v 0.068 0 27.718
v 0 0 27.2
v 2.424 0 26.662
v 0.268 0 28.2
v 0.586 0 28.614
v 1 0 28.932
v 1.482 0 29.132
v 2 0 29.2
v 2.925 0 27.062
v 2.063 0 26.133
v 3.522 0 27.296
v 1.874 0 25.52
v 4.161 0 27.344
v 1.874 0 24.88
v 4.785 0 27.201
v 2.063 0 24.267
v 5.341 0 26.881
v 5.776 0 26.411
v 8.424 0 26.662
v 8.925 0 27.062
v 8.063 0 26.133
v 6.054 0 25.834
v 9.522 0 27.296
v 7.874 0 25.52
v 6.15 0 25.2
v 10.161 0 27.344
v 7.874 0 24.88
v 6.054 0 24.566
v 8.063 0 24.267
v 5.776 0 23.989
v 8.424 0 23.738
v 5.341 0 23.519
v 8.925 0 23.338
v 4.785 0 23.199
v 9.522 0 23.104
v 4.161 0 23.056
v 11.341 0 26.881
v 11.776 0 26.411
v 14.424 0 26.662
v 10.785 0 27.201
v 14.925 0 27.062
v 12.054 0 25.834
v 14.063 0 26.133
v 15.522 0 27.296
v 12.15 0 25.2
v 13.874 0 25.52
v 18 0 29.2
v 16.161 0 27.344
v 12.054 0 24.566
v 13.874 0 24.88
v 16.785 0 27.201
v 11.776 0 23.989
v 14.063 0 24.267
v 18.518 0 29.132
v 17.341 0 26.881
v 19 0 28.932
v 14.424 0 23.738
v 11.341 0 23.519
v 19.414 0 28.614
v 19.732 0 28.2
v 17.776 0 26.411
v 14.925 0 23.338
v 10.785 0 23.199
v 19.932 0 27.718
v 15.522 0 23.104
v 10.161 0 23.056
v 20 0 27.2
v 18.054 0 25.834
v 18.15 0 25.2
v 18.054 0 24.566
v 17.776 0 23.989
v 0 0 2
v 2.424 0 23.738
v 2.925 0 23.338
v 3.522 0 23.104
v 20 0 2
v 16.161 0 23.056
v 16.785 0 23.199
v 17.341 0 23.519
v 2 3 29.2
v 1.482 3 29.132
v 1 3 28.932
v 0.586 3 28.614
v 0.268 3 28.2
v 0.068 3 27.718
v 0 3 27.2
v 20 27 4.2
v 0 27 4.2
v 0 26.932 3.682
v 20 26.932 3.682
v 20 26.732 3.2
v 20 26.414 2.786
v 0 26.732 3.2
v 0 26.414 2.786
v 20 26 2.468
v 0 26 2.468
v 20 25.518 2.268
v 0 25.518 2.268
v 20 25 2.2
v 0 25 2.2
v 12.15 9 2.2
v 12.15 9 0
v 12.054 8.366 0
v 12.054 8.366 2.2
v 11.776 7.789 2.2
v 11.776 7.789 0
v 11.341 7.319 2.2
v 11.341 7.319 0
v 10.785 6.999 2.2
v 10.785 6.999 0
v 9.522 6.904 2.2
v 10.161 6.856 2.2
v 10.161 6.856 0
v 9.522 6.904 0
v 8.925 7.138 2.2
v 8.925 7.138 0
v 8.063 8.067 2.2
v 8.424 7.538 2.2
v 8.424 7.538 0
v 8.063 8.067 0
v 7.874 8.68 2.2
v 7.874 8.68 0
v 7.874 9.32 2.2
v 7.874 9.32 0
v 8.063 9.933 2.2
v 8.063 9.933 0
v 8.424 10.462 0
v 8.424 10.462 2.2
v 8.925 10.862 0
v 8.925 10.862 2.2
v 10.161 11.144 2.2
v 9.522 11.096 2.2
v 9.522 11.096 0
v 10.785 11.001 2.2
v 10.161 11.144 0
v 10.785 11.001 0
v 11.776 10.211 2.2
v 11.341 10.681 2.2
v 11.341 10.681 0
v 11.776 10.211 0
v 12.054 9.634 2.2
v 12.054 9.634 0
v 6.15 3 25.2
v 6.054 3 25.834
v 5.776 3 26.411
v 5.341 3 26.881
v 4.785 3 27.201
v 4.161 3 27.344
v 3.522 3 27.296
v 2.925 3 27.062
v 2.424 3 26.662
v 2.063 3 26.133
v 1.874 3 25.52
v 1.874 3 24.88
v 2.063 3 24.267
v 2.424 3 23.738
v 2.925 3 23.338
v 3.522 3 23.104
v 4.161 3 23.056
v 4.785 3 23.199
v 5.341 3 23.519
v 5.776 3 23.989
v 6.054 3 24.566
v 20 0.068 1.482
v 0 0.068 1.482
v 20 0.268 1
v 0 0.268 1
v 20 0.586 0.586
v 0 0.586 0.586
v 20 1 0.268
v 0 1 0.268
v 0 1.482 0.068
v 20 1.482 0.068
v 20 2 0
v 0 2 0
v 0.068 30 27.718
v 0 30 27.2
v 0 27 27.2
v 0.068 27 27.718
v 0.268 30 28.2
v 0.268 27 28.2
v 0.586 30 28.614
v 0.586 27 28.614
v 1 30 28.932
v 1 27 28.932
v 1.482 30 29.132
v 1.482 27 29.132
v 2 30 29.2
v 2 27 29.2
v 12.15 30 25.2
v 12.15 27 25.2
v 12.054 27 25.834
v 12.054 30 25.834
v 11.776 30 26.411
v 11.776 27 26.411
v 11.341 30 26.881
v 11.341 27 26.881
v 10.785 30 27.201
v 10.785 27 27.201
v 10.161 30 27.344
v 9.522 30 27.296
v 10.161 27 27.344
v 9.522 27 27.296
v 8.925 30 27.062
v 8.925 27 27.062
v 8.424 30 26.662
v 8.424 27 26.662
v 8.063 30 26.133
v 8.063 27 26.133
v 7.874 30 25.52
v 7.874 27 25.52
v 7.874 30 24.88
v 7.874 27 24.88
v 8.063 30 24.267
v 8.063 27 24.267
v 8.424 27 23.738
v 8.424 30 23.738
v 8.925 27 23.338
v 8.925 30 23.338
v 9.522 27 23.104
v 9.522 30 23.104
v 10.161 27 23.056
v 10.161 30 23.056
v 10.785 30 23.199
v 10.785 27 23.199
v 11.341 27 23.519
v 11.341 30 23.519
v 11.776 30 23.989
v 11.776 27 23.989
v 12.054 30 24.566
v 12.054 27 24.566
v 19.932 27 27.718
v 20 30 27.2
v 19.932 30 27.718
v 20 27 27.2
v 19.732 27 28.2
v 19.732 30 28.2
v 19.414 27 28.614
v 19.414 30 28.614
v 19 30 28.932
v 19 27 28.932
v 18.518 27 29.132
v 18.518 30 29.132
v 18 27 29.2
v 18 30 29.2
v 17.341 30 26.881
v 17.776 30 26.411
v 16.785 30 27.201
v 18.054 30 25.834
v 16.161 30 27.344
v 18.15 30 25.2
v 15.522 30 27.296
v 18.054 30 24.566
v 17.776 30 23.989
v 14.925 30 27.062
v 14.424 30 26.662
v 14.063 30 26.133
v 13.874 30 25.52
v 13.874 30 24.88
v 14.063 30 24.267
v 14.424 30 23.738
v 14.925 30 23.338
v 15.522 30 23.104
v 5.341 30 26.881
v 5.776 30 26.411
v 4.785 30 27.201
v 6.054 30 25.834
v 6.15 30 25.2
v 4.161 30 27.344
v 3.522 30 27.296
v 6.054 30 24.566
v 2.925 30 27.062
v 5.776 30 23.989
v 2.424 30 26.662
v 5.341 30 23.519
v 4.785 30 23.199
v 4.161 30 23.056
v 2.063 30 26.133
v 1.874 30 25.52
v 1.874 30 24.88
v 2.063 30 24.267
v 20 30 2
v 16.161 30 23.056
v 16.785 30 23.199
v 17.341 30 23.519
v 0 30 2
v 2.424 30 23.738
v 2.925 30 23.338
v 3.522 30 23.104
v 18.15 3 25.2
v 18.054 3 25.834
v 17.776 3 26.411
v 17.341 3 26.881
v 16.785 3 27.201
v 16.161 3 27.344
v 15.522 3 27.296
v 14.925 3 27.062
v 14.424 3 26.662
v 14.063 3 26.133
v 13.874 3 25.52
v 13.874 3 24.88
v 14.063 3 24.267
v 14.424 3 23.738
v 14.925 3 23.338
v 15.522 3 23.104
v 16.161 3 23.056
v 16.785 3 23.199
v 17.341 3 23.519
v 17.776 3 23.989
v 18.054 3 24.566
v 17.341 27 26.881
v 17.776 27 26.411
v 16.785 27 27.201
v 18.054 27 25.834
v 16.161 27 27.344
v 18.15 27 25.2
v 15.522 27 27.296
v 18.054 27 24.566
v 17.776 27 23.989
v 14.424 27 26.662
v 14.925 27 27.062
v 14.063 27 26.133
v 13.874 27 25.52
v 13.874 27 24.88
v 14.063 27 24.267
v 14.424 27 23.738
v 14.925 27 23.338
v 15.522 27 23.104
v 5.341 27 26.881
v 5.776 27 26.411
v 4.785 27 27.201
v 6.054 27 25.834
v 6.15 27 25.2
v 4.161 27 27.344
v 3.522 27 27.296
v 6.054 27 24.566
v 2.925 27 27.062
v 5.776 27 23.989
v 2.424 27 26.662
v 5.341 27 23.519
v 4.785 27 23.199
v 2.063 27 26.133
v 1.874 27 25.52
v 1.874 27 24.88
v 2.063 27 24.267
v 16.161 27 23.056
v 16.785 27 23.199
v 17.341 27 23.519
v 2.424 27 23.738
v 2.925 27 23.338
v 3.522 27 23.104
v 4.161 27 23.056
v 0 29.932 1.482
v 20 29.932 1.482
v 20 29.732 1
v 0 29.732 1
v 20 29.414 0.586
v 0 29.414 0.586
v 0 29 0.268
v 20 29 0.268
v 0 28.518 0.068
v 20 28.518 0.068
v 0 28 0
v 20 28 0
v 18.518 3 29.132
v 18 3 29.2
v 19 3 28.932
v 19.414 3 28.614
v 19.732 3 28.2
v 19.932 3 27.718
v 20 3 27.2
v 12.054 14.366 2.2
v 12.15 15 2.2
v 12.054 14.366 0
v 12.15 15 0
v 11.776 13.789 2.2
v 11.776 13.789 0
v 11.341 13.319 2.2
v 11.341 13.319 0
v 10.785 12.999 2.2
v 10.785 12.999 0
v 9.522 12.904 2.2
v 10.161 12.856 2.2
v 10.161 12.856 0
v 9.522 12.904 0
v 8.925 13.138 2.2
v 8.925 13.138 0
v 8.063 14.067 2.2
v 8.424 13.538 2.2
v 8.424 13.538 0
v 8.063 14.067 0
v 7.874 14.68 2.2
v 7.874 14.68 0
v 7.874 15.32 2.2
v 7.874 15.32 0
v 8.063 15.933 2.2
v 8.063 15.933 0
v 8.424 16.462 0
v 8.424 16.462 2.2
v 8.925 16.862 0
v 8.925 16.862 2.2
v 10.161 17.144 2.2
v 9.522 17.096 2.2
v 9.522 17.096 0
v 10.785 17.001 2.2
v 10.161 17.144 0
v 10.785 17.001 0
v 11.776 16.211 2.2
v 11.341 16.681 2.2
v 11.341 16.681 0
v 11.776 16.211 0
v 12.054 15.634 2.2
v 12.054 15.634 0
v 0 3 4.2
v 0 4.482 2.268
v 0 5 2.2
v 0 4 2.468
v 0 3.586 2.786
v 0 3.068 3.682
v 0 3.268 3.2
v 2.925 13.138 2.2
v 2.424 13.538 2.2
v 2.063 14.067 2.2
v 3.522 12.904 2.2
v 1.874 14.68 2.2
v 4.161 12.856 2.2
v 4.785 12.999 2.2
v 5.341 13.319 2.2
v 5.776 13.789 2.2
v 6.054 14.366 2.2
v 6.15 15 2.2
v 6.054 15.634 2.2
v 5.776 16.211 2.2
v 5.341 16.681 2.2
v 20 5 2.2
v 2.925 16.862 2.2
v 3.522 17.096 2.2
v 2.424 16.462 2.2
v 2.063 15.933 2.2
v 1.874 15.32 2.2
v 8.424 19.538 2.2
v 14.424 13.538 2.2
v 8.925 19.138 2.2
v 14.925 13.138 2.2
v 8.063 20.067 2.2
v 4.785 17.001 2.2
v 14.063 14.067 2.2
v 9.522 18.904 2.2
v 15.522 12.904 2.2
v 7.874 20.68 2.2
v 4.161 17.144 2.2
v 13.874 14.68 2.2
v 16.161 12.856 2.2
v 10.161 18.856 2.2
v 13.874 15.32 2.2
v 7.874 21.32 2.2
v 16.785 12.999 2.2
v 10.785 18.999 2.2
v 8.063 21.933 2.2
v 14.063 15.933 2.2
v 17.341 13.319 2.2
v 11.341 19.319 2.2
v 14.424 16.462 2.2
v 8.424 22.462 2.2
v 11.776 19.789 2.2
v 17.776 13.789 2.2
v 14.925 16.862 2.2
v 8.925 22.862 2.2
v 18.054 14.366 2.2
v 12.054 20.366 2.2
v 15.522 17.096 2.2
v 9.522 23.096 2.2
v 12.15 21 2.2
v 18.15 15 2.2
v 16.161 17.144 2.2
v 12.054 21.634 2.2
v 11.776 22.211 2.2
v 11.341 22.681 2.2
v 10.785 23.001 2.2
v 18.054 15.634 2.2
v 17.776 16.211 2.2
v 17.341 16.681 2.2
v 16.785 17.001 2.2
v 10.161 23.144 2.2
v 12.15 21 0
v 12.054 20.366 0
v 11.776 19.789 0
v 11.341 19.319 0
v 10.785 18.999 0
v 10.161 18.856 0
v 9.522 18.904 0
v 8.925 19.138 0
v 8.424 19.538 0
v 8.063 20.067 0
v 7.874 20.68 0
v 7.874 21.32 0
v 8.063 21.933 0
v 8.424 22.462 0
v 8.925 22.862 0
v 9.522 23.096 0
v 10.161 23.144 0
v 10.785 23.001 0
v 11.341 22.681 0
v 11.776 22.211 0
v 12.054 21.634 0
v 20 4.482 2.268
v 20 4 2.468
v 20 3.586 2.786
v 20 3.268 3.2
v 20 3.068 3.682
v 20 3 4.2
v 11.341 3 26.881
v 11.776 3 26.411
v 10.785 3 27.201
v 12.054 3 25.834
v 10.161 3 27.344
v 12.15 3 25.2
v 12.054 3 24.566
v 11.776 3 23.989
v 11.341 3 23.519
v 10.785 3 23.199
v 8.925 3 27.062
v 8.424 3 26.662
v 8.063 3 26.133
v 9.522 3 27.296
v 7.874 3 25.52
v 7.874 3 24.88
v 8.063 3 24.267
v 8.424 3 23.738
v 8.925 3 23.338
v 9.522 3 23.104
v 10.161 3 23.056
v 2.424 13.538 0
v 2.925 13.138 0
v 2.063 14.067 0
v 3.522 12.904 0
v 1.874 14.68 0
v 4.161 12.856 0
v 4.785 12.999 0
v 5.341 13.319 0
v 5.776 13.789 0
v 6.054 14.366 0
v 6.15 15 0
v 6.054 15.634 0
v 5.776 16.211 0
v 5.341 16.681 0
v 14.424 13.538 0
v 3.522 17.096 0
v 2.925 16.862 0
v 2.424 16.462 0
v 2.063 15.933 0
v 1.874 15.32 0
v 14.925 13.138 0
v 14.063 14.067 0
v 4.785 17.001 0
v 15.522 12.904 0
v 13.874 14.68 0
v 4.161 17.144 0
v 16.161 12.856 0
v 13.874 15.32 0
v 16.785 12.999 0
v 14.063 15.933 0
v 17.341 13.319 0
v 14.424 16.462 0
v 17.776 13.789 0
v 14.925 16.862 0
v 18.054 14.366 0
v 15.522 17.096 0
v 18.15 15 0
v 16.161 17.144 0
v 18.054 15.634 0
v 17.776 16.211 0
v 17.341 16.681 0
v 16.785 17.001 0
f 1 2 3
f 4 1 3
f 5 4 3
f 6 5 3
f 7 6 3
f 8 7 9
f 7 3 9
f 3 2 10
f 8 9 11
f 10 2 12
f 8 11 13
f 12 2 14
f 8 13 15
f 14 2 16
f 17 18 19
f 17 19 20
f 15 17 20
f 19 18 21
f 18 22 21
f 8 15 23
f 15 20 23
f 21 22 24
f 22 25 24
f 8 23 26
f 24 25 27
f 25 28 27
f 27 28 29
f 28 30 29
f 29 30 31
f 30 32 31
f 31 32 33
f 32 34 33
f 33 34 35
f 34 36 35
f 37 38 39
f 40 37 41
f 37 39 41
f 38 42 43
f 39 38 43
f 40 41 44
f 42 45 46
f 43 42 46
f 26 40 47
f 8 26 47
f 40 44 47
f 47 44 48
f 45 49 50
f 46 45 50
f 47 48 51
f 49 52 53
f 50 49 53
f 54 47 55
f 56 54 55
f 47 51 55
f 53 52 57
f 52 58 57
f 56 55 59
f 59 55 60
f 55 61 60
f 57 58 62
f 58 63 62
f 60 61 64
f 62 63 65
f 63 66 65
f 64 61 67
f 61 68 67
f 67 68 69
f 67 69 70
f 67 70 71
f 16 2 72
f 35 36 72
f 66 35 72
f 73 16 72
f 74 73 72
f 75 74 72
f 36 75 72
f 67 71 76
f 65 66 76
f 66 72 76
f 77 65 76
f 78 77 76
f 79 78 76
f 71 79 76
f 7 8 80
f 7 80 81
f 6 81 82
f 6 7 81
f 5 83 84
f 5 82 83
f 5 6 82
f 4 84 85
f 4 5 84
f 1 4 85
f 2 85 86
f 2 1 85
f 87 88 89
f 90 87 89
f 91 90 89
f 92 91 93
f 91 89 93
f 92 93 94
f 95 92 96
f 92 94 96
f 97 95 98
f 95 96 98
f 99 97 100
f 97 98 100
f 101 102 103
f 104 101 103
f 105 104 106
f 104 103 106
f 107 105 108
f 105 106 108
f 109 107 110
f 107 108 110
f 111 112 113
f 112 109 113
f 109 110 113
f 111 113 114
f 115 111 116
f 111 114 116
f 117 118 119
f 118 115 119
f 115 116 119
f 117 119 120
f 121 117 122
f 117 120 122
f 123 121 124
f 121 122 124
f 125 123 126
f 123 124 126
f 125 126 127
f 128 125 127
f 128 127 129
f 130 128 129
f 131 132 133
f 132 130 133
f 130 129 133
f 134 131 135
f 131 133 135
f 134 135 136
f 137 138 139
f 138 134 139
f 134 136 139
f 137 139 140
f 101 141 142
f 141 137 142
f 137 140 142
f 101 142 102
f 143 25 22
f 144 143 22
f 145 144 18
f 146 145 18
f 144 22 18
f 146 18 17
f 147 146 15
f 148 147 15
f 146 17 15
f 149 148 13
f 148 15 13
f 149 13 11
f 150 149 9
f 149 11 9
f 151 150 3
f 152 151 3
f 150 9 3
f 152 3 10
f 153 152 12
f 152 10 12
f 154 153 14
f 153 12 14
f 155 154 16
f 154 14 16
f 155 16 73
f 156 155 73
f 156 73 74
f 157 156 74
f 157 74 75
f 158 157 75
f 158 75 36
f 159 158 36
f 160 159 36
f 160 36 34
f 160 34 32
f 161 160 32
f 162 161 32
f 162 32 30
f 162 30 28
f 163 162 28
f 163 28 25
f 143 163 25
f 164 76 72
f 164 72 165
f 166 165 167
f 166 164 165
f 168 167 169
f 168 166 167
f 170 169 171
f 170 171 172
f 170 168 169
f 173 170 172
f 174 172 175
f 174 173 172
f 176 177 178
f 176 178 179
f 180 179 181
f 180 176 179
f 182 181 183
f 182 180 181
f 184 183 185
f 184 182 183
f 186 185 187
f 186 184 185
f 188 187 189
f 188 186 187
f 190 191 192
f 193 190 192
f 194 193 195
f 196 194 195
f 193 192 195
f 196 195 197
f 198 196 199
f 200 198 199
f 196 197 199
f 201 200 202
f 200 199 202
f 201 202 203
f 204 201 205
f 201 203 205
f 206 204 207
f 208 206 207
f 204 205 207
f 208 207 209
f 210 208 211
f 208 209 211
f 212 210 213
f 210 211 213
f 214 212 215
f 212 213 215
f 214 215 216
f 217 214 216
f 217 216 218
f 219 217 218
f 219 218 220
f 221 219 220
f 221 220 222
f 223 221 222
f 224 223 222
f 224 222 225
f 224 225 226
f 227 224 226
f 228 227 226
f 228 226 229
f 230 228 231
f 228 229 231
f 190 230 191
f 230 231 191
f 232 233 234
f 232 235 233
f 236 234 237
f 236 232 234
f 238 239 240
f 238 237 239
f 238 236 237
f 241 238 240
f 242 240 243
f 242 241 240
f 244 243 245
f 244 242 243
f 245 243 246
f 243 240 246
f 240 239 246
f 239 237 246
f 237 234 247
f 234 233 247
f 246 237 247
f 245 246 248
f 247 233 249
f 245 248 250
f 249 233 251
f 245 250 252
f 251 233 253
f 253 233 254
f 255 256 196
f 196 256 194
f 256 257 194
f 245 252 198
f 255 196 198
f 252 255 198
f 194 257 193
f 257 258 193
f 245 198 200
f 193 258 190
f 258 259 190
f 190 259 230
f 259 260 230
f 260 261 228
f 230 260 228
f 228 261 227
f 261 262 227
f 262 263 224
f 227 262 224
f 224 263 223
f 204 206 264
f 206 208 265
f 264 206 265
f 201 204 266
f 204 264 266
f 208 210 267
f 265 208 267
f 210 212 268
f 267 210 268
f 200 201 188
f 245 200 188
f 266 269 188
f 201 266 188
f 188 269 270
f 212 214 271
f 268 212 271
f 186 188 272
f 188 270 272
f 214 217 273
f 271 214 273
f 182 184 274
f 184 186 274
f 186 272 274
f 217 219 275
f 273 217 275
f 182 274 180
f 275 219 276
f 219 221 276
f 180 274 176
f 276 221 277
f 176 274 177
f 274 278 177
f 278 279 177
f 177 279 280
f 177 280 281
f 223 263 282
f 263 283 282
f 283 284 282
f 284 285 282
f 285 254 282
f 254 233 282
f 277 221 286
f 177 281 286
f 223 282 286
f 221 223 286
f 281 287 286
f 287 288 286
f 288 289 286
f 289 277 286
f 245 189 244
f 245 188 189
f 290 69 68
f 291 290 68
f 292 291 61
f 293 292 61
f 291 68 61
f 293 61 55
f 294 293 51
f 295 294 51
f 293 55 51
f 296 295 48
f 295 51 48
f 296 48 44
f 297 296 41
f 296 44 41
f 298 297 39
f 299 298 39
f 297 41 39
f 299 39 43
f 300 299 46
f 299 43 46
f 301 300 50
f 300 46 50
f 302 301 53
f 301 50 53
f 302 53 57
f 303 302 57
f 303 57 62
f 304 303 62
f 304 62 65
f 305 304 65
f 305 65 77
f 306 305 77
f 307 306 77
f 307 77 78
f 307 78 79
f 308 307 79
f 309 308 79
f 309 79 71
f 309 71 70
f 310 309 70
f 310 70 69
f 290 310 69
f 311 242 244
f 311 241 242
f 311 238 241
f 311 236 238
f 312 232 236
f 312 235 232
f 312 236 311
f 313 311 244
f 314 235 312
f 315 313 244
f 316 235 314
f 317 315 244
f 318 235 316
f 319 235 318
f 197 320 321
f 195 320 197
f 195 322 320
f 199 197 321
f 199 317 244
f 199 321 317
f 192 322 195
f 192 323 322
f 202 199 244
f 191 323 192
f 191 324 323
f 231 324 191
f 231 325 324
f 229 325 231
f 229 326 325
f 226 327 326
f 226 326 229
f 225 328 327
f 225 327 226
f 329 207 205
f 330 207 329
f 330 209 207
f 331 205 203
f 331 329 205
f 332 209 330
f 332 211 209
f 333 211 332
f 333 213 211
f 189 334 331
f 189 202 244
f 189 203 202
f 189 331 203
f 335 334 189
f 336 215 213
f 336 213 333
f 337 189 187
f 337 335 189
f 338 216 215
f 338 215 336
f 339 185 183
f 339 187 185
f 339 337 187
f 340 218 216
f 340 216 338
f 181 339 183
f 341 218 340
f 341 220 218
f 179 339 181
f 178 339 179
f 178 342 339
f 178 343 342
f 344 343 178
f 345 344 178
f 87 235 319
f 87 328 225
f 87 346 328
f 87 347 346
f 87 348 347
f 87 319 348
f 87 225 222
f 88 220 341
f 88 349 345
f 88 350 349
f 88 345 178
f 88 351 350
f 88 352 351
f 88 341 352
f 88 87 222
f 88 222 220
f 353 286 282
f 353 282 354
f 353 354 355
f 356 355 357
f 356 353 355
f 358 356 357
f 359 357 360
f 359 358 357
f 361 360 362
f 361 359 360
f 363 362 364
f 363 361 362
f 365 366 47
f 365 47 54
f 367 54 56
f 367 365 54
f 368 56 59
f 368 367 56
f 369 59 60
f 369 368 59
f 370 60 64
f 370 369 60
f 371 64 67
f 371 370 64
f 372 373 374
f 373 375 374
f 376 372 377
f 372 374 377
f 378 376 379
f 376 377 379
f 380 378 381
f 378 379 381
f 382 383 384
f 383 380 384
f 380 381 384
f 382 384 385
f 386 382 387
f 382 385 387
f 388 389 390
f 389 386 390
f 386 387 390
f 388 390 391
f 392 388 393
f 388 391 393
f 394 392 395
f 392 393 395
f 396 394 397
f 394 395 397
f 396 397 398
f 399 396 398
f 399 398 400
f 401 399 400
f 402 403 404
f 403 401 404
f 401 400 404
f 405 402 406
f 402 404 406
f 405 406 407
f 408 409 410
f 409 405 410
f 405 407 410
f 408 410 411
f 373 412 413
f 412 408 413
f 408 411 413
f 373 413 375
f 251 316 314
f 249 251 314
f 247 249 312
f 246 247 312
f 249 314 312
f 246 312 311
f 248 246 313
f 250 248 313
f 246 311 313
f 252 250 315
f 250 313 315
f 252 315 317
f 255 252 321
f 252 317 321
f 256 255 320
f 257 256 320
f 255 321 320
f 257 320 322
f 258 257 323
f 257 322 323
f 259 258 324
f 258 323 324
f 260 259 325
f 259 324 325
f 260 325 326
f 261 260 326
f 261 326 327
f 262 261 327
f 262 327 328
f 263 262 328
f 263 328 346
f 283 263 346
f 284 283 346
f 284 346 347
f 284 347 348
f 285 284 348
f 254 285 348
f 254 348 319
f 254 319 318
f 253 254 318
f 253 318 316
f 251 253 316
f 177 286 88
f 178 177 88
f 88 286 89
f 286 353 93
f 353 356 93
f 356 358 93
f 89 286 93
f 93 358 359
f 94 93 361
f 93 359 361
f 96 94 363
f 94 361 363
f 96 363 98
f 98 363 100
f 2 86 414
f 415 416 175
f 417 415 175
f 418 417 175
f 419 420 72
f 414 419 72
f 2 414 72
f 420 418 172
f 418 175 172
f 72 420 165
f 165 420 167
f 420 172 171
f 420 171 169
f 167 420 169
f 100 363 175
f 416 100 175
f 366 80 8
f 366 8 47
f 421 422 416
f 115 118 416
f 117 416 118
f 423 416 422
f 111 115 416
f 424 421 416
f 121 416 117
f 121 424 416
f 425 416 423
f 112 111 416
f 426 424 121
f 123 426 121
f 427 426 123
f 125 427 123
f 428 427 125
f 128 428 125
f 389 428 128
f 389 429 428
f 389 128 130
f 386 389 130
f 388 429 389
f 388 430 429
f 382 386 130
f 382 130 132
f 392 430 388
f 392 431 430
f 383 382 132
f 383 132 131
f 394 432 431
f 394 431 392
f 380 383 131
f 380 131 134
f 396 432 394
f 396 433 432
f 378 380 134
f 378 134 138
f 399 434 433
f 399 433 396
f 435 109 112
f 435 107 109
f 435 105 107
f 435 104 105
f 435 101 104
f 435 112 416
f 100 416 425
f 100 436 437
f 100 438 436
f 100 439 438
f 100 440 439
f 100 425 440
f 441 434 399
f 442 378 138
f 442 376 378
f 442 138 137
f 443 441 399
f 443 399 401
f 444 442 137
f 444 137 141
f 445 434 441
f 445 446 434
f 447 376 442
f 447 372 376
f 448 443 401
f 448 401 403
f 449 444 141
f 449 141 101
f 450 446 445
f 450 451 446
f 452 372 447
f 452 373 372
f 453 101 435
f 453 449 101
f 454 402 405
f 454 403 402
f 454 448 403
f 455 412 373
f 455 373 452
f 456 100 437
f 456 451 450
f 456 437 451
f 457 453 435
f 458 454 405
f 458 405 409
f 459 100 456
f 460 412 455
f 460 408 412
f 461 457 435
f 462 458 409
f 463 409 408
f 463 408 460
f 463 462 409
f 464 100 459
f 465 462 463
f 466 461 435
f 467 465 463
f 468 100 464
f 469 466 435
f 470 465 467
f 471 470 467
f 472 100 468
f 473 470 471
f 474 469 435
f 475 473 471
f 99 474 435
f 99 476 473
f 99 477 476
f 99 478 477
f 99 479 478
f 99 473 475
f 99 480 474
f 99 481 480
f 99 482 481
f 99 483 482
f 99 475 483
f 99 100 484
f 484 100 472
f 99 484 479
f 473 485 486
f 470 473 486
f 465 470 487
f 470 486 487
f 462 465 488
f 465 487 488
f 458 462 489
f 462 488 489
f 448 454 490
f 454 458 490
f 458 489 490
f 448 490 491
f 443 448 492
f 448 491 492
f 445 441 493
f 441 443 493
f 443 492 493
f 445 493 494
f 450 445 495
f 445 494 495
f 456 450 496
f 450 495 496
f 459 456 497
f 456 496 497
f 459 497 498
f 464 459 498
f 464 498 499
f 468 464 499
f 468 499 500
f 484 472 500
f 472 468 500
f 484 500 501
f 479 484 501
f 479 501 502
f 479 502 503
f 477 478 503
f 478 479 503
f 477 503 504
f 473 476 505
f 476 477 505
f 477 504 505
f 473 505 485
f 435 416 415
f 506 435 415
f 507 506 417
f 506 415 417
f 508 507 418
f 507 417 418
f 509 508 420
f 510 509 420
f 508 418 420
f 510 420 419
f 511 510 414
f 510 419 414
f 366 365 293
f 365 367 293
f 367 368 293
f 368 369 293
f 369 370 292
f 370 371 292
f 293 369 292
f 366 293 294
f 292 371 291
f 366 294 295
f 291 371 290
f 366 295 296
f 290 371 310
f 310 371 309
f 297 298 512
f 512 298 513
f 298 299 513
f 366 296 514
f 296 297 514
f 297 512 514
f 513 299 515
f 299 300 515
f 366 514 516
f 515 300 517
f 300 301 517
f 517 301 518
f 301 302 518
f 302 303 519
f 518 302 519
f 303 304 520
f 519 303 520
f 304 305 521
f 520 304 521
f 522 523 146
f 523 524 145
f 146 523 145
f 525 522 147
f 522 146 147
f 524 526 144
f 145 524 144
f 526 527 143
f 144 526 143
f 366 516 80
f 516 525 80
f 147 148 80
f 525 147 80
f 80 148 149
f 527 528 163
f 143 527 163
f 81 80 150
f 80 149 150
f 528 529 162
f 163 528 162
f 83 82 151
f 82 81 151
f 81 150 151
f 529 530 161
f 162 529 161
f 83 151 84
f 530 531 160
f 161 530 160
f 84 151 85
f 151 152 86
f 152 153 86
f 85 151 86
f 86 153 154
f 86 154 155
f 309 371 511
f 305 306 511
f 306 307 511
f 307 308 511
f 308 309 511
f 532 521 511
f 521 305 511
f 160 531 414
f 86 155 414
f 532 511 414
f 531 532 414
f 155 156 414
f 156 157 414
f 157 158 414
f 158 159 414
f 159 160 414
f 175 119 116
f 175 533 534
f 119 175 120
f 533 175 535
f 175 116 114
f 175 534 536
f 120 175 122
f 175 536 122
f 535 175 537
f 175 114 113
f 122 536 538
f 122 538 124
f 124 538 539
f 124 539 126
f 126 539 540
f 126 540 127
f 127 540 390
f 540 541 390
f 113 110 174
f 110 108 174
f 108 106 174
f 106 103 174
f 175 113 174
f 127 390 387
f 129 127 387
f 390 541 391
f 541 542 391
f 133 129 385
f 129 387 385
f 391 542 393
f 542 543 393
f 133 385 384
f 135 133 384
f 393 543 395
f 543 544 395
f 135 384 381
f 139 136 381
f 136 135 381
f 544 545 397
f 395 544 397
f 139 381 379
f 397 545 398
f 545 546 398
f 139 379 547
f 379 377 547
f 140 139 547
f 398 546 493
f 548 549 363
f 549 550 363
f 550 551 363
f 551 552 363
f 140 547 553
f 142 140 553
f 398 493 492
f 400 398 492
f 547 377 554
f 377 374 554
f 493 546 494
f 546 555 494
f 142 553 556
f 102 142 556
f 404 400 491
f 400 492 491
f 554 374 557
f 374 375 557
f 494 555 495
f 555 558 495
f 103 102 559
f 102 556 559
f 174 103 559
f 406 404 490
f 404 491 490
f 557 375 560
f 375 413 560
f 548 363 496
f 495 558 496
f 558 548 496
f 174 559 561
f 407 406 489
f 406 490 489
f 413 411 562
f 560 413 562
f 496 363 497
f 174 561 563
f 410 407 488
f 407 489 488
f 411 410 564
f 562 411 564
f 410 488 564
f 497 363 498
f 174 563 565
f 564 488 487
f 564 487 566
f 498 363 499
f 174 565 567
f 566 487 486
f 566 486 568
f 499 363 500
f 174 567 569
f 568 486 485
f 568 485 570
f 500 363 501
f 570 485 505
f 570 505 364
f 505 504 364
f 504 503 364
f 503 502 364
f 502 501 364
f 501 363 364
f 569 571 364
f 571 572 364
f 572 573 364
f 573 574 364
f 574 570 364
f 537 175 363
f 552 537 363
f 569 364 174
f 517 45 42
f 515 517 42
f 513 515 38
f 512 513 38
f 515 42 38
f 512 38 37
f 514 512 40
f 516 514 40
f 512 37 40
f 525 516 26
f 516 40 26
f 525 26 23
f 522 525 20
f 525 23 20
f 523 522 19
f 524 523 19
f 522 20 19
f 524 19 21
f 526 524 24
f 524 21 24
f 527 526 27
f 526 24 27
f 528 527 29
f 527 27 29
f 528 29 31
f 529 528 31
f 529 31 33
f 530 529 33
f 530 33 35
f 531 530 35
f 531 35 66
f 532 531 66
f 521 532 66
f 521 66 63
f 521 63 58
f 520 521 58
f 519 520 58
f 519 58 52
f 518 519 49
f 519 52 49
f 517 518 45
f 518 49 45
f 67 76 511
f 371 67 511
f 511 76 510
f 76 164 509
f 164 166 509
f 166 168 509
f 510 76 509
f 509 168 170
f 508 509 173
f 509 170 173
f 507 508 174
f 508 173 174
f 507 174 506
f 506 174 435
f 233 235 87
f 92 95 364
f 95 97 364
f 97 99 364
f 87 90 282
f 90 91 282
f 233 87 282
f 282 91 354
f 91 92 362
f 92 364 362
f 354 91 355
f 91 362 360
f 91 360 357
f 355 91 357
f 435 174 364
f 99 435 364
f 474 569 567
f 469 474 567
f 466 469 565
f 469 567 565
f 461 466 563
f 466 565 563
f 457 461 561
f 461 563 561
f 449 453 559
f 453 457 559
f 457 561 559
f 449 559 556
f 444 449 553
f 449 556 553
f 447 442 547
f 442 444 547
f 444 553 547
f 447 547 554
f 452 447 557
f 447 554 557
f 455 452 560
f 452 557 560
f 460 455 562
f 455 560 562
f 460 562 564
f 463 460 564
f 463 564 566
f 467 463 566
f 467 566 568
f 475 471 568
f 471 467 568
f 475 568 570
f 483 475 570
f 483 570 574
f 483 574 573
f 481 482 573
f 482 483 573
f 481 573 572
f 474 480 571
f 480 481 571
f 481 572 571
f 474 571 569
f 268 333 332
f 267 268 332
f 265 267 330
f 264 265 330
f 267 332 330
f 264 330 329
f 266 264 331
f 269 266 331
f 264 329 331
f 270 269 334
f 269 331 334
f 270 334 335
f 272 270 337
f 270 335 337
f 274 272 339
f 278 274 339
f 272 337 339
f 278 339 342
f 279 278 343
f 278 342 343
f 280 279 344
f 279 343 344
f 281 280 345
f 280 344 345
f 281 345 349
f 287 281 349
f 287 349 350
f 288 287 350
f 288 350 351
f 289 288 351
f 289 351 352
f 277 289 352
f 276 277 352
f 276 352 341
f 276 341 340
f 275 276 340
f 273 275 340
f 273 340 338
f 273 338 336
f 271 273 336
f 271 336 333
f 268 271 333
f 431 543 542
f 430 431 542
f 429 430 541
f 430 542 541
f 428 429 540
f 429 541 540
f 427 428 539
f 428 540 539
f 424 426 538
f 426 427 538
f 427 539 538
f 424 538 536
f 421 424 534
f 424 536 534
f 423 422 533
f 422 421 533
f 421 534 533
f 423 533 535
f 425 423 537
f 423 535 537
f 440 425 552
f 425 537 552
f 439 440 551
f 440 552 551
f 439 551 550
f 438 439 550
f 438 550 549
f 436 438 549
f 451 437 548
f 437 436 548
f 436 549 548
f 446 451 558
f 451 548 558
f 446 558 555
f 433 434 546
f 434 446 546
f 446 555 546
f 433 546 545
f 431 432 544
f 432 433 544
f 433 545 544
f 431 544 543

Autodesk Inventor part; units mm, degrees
ref_plane "YZ Plane" through (0, 0, 0) normal (1, 0, 0) x (0, 1, 0)
ref_plane "XZ Plane" through (0, 0, 0) normal (0, 1, 0) x (-1, 0, 0)
ref_plane "XY Plane" through (0, 0, 0) normal (0, 0, 1) x (1, 0, 0)
sketch "Esquisse5" plane through (0, 0, 0) normal (0, 0, 1) x (1, 0, 0)
  line L0 (0, 0) -> (20, 0)
  line L1 (20, 0) -> (20, 30)
  line L2 (20, 30) -> (0, 30)
  line L3 (0, 30) -> (0, 0)
  line L4 (10, 0) -> (10, 30) construction
  circle A0 centre (10, 9) radius 2.15
  circle A1 centre (10, 15) radius 2.15
  circle A2 centre (10, 21) radius 2.15
  line L5 (10, 15) -> (20, 15) construction
  circle A3 centre (16, 15) radius 2.15
  circle A4 centre (4, 15) radius 2.15
  circle A5 centre (10, 15) radius 2.15
  dimension "d61" = 20
  dimension "d62" = 30
  dimension "d64" = 4.3
  dimension "d67" = 6
  dimension "d74" = 6
  dimension "d77" = 6
extrude "Extrusion5" add sketch "Esquisse5" along normal blind 2.2
sketch "Esquisse9" plane through (0, 0, 2.2) normal (0, 0, 1) x (1, 0, 0)
  line L0 (20, 0) -> (20, 30) construction
  line L1 (0, 30) -> (0, 0) construction
  line L2 (0, 30) -> (20, 30)
  line L3 (20, 30) -> (20, 27)
  line L4 (20, 27) -> (0, 27)
  line L5 (0, 27) -> (0, 30)
  line L6 (0, 15) -> (20, 15) construction
  line L7 (20, 0) -> (0, 0) construction
  line L8 (0, 0) -> (20, 0)
  line L9 (20, 0) -> (20, 3)
  line L10 (20, 3) -> (0, 3)
  line L11 (0, 3) -> (0, 0)
  dimension "d102" = 3
extrude "Extrusion9" add sketch "Esquisse9" along normal blind 27
sketch "Esquisse10" plane through (0, 0, 0) normal (0, -1, 0) x (1, 0, 0)
  line L0 (0, 0) -> (20, 0) construction
  line L1 (20, 0) -> (20, 29.2) construction
  line L2 (0, 29.2) -> (20, 29.2) construction
  line L3 (10, 29.2) -> (10, 0) construction
  circle A0 centre (10, 25.2) radius 2.15
  line L4 (10, 25.2) -> (20, 25.2) construction
  circle A1 centre (16, 25.2) radius 2.15
  circle A2 centre (4, 25.2) radius 2.15
  circle A3 centre (10, 25.2) radius 2.15
  dimension "d105" = 4
  dimension "d106" = 4.3
  dimension "d109" = 6
  dimension "d112" = 6
extrude "Extrusion10" cut sketch "Esquisse10" against normal through all
fillet "Congé6" radius 2 8 edges at (10, 0, 0) (10, 3, 2.2) (10, 27, 2.2) (0, 28.5, 29.2) (20, 28.5, 29.2) (20, 1.5, 29.2) (0, 1.5, 29.2) (10, 30, 0)
equation "\"d64\" = Holes"
equation "\"d80\" = Depth"
equation "\"d106\" = Holes"
equation "\"Depth\" = 2.2"
equation "\"Holes\" = 4.3"
equation "\"Height\" = 0"
equation "\"Rounding\" = 7"
equation "\"BackLegUpperBoneLength\" = 17"
properties part number "BackLegUpperUpperBone"
